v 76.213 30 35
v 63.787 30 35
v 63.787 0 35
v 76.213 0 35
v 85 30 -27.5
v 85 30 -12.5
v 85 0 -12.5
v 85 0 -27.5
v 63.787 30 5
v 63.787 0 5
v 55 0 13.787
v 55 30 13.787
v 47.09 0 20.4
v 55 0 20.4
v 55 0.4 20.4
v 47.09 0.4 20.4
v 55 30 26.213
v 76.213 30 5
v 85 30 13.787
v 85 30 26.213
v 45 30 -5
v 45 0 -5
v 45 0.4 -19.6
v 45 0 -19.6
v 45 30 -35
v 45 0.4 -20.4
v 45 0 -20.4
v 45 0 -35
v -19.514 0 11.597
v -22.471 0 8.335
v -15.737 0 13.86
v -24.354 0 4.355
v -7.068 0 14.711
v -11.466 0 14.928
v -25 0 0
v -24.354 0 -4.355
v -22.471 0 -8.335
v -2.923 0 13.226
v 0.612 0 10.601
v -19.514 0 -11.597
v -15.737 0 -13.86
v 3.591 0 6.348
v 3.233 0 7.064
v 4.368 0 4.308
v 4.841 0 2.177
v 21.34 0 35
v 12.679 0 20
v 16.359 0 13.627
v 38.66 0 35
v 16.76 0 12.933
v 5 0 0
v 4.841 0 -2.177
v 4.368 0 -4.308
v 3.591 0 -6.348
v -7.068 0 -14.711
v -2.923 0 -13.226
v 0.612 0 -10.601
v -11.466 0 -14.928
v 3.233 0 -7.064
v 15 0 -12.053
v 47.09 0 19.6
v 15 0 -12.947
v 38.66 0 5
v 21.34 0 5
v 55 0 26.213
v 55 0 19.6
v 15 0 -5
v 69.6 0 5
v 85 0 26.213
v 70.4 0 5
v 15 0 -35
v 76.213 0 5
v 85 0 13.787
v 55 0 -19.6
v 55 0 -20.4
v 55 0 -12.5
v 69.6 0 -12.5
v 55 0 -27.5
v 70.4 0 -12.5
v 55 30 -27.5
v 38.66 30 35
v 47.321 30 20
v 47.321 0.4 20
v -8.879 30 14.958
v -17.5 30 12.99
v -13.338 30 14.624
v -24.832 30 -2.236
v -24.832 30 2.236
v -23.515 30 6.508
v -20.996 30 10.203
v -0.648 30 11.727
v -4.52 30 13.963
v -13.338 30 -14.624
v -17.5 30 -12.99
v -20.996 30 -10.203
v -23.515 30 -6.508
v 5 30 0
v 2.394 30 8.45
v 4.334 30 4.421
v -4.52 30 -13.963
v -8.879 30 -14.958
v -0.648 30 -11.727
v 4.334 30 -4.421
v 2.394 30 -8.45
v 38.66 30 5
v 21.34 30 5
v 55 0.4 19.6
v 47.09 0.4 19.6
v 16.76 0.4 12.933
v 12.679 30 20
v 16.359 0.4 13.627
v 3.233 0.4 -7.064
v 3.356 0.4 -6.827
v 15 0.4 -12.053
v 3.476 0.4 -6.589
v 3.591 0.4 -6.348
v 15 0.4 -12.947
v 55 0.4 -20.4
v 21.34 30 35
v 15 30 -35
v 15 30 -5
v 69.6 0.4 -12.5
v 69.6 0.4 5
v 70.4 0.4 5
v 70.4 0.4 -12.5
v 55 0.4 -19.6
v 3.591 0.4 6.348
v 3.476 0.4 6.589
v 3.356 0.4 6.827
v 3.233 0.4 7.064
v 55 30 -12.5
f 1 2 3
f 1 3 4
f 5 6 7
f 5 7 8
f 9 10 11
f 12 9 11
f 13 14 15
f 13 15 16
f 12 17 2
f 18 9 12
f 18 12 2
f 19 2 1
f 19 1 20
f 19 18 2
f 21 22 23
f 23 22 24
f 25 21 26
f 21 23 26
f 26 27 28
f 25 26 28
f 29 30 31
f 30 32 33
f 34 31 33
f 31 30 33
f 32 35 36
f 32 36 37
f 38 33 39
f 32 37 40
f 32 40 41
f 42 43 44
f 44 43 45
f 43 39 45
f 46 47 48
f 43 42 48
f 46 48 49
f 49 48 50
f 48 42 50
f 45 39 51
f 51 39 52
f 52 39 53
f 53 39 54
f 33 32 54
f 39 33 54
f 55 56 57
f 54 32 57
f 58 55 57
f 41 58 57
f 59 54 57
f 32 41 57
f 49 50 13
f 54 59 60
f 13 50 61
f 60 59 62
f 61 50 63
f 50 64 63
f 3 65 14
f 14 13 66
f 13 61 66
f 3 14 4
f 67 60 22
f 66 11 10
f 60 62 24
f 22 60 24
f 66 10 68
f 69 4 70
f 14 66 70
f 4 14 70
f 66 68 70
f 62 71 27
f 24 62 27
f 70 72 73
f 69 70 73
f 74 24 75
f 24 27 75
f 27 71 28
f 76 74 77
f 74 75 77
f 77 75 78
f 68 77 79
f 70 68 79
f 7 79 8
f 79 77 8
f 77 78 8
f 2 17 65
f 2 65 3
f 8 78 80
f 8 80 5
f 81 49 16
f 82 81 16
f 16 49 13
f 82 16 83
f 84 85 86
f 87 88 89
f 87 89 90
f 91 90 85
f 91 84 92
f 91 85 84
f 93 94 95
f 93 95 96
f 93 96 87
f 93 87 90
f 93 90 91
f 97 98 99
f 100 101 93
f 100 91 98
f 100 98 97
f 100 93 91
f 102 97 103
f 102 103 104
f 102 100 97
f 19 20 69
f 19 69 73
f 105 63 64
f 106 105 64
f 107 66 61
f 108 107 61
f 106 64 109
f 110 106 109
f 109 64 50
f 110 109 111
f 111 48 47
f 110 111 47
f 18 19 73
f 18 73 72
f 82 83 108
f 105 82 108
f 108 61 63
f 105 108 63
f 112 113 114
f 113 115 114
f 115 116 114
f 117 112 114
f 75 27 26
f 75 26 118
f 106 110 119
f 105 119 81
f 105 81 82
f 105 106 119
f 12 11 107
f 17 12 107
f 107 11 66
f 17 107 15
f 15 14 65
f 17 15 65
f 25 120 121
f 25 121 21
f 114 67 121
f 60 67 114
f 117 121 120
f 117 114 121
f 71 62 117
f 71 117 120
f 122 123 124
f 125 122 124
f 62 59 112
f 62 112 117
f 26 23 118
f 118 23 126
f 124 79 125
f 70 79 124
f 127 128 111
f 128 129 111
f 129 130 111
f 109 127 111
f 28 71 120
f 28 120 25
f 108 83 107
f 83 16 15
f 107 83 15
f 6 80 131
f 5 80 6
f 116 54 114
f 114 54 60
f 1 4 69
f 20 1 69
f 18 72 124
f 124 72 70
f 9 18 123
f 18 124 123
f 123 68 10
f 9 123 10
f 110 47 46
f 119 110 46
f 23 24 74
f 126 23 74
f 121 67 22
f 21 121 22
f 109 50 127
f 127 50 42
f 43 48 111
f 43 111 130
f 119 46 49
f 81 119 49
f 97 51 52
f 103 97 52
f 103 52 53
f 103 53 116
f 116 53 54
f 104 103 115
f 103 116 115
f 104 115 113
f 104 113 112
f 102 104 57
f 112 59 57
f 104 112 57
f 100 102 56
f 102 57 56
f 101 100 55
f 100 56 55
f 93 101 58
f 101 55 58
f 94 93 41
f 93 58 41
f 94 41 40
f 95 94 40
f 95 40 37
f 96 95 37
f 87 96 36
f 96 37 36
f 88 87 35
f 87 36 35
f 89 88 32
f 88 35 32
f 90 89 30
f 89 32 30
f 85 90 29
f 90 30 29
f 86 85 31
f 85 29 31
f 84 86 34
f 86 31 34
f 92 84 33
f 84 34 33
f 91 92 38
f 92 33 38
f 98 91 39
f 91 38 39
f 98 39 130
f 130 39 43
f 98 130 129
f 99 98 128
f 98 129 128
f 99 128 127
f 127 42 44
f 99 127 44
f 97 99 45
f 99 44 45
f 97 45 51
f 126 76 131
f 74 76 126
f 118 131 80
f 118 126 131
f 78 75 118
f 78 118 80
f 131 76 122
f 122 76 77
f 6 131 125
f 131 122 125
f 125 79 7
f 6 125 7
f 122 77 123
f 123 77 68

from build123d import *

# Parameters (mm, degrees)
SKIZZE1_R                         = 15
AUFSATZ_LINEAR_AUSTRAGEN1_DEPTH   = 30
SKIZZE1_W                         = 30
SKIZZE1_H                         = 30
AUFSATZ_LINEAR_AUSTRAGEN1_2_DEPTH = 30
AUFSATZ_LINEAR_AUSTRAGEN1_3_DEPTH = 30
SKIZZE1_H_2                       = 15
AUFSATZ_LINEAR_AUSTRAGEN1_4_DEPTH = 30
AUFSATZ_LINEAR_AUSTRAGEN1_5_DEPTH = 30
LINEAR_AUSTRAGEN_D_NN1_DEPTH      = 0.4


with BuildPart() as part:
    # Skizze1 → Aufsatz-Linear austragen1 (new body)
    with BuildSketch(Plane(origin=(0, 0, 0), x_dir=(1, 0, 0), z_dir=(0, 1, 0))):
        with Locations((-10, 0)):
            Circle(SKIZZE1_R)
    extrude(amount=AUFSATZ_LINEAR_AUSTRAGEN1_DEPTH)



with BuildPart() as body_2:
    # Skizze1 → Aufsatz-Linear austragen1 2 (new body)
    with BuildSketch(Plane(origin=(0, 0, 0), x_dir=(1, 0, 0), z_dir=(0, 1, 0))):
        with Locations((30, 20)):
            Rectangle(SKIZZE1_W, SKIZZE1_H)
    extrude(amount=AUFSATZ_LINEAR_AUSTRAGEN1_2_DEPTH)


with BuildPart() as body_3:
    # Skizze1 → Aufsatz-Linear austragen1 3 (new body)
    with BuildSketch(Plane(origin=(0, 0, 0), x_dir=(1, 0, 0), z_dir=(0, 1, 0))):
        Polygon((38.660254038, -5), (21.339745962, -5), (12.679491924, -20), (21.339745962, -35), (38.660254038, -35), (47.320508076, -20), align=None)
    extrude(amount=AUFSATZ_LINEAR_AUSTRAGEN1_3_DEPTH)


with BuildPart() as body_4:
    # Skizze1 → Aufsatz-Linear austragen1 4 (new body)
    with BuildSketch(Plane(origin=(0, 0, 0), x_dir=(1, 0, 0), z_dir=(0, 1, 0))):
        with Locations((70, 20)):
            Rectangle(SKIZZE1_W, SKIZZE1_H_2)
    extrude(amount=AUFSATZ_LINEAR_AUSTRAGEN1_4_DEPTH)


with BuildPart() as body_5:
    # Skizze1 → Aufsatz-Linear austragen1 5 (new body)
    with BuildSketch(Plane(origin=(0, 0, 0), x_dir=(1, 0, 0), z_dir=(0, 1, 0))):
        Polygon((76.213203436, -5), (63.786796564, -5), (55, -13.786796564), (55, -26.213203436), (63.786796564, -35), (76.213203436, -35), (85, -26.213203436), (85, -13.786796564), align=None)
    extrude(amount=AUFSATZ_LINEAR_AUSTRAGEN1_5_DEPTH)


with BuildPart() as part_1:
    add(part.part)

    add(body_2.part)  # Linear-Austragen-Dünn1 merges body 2

    add(body_3.part)  # Linear-Austragen-Dünn1 merges body 3

    add(body_4.part)  # Linear-Austragen-Dünn1 merges body 4

    add(body_5.part)  # Linear-Austragen-Dünn1 merges body 5
    # Skizze2 → Linear-Austragen-Dünn1 (add)
    with BuildSketch(Plane.XZ):
        Polygon((29.905572809, 20.4), (-10.894427191, 0), (29.905572809, -20.4), (70.4, -20.4), (70.4, 20.4), align=None)
        Polygon((30.094427191, 19.6), (-9.105572809, 0), (30.094427191, -19.6), (69.6, -19.6), (69.6, 19.6), align=None, mode=Mode.SUBTRACT)
    extrude(amount=-LINEAR_AUSTRAGEN_D_NN1_DEPTH)


solid = part_1.part
